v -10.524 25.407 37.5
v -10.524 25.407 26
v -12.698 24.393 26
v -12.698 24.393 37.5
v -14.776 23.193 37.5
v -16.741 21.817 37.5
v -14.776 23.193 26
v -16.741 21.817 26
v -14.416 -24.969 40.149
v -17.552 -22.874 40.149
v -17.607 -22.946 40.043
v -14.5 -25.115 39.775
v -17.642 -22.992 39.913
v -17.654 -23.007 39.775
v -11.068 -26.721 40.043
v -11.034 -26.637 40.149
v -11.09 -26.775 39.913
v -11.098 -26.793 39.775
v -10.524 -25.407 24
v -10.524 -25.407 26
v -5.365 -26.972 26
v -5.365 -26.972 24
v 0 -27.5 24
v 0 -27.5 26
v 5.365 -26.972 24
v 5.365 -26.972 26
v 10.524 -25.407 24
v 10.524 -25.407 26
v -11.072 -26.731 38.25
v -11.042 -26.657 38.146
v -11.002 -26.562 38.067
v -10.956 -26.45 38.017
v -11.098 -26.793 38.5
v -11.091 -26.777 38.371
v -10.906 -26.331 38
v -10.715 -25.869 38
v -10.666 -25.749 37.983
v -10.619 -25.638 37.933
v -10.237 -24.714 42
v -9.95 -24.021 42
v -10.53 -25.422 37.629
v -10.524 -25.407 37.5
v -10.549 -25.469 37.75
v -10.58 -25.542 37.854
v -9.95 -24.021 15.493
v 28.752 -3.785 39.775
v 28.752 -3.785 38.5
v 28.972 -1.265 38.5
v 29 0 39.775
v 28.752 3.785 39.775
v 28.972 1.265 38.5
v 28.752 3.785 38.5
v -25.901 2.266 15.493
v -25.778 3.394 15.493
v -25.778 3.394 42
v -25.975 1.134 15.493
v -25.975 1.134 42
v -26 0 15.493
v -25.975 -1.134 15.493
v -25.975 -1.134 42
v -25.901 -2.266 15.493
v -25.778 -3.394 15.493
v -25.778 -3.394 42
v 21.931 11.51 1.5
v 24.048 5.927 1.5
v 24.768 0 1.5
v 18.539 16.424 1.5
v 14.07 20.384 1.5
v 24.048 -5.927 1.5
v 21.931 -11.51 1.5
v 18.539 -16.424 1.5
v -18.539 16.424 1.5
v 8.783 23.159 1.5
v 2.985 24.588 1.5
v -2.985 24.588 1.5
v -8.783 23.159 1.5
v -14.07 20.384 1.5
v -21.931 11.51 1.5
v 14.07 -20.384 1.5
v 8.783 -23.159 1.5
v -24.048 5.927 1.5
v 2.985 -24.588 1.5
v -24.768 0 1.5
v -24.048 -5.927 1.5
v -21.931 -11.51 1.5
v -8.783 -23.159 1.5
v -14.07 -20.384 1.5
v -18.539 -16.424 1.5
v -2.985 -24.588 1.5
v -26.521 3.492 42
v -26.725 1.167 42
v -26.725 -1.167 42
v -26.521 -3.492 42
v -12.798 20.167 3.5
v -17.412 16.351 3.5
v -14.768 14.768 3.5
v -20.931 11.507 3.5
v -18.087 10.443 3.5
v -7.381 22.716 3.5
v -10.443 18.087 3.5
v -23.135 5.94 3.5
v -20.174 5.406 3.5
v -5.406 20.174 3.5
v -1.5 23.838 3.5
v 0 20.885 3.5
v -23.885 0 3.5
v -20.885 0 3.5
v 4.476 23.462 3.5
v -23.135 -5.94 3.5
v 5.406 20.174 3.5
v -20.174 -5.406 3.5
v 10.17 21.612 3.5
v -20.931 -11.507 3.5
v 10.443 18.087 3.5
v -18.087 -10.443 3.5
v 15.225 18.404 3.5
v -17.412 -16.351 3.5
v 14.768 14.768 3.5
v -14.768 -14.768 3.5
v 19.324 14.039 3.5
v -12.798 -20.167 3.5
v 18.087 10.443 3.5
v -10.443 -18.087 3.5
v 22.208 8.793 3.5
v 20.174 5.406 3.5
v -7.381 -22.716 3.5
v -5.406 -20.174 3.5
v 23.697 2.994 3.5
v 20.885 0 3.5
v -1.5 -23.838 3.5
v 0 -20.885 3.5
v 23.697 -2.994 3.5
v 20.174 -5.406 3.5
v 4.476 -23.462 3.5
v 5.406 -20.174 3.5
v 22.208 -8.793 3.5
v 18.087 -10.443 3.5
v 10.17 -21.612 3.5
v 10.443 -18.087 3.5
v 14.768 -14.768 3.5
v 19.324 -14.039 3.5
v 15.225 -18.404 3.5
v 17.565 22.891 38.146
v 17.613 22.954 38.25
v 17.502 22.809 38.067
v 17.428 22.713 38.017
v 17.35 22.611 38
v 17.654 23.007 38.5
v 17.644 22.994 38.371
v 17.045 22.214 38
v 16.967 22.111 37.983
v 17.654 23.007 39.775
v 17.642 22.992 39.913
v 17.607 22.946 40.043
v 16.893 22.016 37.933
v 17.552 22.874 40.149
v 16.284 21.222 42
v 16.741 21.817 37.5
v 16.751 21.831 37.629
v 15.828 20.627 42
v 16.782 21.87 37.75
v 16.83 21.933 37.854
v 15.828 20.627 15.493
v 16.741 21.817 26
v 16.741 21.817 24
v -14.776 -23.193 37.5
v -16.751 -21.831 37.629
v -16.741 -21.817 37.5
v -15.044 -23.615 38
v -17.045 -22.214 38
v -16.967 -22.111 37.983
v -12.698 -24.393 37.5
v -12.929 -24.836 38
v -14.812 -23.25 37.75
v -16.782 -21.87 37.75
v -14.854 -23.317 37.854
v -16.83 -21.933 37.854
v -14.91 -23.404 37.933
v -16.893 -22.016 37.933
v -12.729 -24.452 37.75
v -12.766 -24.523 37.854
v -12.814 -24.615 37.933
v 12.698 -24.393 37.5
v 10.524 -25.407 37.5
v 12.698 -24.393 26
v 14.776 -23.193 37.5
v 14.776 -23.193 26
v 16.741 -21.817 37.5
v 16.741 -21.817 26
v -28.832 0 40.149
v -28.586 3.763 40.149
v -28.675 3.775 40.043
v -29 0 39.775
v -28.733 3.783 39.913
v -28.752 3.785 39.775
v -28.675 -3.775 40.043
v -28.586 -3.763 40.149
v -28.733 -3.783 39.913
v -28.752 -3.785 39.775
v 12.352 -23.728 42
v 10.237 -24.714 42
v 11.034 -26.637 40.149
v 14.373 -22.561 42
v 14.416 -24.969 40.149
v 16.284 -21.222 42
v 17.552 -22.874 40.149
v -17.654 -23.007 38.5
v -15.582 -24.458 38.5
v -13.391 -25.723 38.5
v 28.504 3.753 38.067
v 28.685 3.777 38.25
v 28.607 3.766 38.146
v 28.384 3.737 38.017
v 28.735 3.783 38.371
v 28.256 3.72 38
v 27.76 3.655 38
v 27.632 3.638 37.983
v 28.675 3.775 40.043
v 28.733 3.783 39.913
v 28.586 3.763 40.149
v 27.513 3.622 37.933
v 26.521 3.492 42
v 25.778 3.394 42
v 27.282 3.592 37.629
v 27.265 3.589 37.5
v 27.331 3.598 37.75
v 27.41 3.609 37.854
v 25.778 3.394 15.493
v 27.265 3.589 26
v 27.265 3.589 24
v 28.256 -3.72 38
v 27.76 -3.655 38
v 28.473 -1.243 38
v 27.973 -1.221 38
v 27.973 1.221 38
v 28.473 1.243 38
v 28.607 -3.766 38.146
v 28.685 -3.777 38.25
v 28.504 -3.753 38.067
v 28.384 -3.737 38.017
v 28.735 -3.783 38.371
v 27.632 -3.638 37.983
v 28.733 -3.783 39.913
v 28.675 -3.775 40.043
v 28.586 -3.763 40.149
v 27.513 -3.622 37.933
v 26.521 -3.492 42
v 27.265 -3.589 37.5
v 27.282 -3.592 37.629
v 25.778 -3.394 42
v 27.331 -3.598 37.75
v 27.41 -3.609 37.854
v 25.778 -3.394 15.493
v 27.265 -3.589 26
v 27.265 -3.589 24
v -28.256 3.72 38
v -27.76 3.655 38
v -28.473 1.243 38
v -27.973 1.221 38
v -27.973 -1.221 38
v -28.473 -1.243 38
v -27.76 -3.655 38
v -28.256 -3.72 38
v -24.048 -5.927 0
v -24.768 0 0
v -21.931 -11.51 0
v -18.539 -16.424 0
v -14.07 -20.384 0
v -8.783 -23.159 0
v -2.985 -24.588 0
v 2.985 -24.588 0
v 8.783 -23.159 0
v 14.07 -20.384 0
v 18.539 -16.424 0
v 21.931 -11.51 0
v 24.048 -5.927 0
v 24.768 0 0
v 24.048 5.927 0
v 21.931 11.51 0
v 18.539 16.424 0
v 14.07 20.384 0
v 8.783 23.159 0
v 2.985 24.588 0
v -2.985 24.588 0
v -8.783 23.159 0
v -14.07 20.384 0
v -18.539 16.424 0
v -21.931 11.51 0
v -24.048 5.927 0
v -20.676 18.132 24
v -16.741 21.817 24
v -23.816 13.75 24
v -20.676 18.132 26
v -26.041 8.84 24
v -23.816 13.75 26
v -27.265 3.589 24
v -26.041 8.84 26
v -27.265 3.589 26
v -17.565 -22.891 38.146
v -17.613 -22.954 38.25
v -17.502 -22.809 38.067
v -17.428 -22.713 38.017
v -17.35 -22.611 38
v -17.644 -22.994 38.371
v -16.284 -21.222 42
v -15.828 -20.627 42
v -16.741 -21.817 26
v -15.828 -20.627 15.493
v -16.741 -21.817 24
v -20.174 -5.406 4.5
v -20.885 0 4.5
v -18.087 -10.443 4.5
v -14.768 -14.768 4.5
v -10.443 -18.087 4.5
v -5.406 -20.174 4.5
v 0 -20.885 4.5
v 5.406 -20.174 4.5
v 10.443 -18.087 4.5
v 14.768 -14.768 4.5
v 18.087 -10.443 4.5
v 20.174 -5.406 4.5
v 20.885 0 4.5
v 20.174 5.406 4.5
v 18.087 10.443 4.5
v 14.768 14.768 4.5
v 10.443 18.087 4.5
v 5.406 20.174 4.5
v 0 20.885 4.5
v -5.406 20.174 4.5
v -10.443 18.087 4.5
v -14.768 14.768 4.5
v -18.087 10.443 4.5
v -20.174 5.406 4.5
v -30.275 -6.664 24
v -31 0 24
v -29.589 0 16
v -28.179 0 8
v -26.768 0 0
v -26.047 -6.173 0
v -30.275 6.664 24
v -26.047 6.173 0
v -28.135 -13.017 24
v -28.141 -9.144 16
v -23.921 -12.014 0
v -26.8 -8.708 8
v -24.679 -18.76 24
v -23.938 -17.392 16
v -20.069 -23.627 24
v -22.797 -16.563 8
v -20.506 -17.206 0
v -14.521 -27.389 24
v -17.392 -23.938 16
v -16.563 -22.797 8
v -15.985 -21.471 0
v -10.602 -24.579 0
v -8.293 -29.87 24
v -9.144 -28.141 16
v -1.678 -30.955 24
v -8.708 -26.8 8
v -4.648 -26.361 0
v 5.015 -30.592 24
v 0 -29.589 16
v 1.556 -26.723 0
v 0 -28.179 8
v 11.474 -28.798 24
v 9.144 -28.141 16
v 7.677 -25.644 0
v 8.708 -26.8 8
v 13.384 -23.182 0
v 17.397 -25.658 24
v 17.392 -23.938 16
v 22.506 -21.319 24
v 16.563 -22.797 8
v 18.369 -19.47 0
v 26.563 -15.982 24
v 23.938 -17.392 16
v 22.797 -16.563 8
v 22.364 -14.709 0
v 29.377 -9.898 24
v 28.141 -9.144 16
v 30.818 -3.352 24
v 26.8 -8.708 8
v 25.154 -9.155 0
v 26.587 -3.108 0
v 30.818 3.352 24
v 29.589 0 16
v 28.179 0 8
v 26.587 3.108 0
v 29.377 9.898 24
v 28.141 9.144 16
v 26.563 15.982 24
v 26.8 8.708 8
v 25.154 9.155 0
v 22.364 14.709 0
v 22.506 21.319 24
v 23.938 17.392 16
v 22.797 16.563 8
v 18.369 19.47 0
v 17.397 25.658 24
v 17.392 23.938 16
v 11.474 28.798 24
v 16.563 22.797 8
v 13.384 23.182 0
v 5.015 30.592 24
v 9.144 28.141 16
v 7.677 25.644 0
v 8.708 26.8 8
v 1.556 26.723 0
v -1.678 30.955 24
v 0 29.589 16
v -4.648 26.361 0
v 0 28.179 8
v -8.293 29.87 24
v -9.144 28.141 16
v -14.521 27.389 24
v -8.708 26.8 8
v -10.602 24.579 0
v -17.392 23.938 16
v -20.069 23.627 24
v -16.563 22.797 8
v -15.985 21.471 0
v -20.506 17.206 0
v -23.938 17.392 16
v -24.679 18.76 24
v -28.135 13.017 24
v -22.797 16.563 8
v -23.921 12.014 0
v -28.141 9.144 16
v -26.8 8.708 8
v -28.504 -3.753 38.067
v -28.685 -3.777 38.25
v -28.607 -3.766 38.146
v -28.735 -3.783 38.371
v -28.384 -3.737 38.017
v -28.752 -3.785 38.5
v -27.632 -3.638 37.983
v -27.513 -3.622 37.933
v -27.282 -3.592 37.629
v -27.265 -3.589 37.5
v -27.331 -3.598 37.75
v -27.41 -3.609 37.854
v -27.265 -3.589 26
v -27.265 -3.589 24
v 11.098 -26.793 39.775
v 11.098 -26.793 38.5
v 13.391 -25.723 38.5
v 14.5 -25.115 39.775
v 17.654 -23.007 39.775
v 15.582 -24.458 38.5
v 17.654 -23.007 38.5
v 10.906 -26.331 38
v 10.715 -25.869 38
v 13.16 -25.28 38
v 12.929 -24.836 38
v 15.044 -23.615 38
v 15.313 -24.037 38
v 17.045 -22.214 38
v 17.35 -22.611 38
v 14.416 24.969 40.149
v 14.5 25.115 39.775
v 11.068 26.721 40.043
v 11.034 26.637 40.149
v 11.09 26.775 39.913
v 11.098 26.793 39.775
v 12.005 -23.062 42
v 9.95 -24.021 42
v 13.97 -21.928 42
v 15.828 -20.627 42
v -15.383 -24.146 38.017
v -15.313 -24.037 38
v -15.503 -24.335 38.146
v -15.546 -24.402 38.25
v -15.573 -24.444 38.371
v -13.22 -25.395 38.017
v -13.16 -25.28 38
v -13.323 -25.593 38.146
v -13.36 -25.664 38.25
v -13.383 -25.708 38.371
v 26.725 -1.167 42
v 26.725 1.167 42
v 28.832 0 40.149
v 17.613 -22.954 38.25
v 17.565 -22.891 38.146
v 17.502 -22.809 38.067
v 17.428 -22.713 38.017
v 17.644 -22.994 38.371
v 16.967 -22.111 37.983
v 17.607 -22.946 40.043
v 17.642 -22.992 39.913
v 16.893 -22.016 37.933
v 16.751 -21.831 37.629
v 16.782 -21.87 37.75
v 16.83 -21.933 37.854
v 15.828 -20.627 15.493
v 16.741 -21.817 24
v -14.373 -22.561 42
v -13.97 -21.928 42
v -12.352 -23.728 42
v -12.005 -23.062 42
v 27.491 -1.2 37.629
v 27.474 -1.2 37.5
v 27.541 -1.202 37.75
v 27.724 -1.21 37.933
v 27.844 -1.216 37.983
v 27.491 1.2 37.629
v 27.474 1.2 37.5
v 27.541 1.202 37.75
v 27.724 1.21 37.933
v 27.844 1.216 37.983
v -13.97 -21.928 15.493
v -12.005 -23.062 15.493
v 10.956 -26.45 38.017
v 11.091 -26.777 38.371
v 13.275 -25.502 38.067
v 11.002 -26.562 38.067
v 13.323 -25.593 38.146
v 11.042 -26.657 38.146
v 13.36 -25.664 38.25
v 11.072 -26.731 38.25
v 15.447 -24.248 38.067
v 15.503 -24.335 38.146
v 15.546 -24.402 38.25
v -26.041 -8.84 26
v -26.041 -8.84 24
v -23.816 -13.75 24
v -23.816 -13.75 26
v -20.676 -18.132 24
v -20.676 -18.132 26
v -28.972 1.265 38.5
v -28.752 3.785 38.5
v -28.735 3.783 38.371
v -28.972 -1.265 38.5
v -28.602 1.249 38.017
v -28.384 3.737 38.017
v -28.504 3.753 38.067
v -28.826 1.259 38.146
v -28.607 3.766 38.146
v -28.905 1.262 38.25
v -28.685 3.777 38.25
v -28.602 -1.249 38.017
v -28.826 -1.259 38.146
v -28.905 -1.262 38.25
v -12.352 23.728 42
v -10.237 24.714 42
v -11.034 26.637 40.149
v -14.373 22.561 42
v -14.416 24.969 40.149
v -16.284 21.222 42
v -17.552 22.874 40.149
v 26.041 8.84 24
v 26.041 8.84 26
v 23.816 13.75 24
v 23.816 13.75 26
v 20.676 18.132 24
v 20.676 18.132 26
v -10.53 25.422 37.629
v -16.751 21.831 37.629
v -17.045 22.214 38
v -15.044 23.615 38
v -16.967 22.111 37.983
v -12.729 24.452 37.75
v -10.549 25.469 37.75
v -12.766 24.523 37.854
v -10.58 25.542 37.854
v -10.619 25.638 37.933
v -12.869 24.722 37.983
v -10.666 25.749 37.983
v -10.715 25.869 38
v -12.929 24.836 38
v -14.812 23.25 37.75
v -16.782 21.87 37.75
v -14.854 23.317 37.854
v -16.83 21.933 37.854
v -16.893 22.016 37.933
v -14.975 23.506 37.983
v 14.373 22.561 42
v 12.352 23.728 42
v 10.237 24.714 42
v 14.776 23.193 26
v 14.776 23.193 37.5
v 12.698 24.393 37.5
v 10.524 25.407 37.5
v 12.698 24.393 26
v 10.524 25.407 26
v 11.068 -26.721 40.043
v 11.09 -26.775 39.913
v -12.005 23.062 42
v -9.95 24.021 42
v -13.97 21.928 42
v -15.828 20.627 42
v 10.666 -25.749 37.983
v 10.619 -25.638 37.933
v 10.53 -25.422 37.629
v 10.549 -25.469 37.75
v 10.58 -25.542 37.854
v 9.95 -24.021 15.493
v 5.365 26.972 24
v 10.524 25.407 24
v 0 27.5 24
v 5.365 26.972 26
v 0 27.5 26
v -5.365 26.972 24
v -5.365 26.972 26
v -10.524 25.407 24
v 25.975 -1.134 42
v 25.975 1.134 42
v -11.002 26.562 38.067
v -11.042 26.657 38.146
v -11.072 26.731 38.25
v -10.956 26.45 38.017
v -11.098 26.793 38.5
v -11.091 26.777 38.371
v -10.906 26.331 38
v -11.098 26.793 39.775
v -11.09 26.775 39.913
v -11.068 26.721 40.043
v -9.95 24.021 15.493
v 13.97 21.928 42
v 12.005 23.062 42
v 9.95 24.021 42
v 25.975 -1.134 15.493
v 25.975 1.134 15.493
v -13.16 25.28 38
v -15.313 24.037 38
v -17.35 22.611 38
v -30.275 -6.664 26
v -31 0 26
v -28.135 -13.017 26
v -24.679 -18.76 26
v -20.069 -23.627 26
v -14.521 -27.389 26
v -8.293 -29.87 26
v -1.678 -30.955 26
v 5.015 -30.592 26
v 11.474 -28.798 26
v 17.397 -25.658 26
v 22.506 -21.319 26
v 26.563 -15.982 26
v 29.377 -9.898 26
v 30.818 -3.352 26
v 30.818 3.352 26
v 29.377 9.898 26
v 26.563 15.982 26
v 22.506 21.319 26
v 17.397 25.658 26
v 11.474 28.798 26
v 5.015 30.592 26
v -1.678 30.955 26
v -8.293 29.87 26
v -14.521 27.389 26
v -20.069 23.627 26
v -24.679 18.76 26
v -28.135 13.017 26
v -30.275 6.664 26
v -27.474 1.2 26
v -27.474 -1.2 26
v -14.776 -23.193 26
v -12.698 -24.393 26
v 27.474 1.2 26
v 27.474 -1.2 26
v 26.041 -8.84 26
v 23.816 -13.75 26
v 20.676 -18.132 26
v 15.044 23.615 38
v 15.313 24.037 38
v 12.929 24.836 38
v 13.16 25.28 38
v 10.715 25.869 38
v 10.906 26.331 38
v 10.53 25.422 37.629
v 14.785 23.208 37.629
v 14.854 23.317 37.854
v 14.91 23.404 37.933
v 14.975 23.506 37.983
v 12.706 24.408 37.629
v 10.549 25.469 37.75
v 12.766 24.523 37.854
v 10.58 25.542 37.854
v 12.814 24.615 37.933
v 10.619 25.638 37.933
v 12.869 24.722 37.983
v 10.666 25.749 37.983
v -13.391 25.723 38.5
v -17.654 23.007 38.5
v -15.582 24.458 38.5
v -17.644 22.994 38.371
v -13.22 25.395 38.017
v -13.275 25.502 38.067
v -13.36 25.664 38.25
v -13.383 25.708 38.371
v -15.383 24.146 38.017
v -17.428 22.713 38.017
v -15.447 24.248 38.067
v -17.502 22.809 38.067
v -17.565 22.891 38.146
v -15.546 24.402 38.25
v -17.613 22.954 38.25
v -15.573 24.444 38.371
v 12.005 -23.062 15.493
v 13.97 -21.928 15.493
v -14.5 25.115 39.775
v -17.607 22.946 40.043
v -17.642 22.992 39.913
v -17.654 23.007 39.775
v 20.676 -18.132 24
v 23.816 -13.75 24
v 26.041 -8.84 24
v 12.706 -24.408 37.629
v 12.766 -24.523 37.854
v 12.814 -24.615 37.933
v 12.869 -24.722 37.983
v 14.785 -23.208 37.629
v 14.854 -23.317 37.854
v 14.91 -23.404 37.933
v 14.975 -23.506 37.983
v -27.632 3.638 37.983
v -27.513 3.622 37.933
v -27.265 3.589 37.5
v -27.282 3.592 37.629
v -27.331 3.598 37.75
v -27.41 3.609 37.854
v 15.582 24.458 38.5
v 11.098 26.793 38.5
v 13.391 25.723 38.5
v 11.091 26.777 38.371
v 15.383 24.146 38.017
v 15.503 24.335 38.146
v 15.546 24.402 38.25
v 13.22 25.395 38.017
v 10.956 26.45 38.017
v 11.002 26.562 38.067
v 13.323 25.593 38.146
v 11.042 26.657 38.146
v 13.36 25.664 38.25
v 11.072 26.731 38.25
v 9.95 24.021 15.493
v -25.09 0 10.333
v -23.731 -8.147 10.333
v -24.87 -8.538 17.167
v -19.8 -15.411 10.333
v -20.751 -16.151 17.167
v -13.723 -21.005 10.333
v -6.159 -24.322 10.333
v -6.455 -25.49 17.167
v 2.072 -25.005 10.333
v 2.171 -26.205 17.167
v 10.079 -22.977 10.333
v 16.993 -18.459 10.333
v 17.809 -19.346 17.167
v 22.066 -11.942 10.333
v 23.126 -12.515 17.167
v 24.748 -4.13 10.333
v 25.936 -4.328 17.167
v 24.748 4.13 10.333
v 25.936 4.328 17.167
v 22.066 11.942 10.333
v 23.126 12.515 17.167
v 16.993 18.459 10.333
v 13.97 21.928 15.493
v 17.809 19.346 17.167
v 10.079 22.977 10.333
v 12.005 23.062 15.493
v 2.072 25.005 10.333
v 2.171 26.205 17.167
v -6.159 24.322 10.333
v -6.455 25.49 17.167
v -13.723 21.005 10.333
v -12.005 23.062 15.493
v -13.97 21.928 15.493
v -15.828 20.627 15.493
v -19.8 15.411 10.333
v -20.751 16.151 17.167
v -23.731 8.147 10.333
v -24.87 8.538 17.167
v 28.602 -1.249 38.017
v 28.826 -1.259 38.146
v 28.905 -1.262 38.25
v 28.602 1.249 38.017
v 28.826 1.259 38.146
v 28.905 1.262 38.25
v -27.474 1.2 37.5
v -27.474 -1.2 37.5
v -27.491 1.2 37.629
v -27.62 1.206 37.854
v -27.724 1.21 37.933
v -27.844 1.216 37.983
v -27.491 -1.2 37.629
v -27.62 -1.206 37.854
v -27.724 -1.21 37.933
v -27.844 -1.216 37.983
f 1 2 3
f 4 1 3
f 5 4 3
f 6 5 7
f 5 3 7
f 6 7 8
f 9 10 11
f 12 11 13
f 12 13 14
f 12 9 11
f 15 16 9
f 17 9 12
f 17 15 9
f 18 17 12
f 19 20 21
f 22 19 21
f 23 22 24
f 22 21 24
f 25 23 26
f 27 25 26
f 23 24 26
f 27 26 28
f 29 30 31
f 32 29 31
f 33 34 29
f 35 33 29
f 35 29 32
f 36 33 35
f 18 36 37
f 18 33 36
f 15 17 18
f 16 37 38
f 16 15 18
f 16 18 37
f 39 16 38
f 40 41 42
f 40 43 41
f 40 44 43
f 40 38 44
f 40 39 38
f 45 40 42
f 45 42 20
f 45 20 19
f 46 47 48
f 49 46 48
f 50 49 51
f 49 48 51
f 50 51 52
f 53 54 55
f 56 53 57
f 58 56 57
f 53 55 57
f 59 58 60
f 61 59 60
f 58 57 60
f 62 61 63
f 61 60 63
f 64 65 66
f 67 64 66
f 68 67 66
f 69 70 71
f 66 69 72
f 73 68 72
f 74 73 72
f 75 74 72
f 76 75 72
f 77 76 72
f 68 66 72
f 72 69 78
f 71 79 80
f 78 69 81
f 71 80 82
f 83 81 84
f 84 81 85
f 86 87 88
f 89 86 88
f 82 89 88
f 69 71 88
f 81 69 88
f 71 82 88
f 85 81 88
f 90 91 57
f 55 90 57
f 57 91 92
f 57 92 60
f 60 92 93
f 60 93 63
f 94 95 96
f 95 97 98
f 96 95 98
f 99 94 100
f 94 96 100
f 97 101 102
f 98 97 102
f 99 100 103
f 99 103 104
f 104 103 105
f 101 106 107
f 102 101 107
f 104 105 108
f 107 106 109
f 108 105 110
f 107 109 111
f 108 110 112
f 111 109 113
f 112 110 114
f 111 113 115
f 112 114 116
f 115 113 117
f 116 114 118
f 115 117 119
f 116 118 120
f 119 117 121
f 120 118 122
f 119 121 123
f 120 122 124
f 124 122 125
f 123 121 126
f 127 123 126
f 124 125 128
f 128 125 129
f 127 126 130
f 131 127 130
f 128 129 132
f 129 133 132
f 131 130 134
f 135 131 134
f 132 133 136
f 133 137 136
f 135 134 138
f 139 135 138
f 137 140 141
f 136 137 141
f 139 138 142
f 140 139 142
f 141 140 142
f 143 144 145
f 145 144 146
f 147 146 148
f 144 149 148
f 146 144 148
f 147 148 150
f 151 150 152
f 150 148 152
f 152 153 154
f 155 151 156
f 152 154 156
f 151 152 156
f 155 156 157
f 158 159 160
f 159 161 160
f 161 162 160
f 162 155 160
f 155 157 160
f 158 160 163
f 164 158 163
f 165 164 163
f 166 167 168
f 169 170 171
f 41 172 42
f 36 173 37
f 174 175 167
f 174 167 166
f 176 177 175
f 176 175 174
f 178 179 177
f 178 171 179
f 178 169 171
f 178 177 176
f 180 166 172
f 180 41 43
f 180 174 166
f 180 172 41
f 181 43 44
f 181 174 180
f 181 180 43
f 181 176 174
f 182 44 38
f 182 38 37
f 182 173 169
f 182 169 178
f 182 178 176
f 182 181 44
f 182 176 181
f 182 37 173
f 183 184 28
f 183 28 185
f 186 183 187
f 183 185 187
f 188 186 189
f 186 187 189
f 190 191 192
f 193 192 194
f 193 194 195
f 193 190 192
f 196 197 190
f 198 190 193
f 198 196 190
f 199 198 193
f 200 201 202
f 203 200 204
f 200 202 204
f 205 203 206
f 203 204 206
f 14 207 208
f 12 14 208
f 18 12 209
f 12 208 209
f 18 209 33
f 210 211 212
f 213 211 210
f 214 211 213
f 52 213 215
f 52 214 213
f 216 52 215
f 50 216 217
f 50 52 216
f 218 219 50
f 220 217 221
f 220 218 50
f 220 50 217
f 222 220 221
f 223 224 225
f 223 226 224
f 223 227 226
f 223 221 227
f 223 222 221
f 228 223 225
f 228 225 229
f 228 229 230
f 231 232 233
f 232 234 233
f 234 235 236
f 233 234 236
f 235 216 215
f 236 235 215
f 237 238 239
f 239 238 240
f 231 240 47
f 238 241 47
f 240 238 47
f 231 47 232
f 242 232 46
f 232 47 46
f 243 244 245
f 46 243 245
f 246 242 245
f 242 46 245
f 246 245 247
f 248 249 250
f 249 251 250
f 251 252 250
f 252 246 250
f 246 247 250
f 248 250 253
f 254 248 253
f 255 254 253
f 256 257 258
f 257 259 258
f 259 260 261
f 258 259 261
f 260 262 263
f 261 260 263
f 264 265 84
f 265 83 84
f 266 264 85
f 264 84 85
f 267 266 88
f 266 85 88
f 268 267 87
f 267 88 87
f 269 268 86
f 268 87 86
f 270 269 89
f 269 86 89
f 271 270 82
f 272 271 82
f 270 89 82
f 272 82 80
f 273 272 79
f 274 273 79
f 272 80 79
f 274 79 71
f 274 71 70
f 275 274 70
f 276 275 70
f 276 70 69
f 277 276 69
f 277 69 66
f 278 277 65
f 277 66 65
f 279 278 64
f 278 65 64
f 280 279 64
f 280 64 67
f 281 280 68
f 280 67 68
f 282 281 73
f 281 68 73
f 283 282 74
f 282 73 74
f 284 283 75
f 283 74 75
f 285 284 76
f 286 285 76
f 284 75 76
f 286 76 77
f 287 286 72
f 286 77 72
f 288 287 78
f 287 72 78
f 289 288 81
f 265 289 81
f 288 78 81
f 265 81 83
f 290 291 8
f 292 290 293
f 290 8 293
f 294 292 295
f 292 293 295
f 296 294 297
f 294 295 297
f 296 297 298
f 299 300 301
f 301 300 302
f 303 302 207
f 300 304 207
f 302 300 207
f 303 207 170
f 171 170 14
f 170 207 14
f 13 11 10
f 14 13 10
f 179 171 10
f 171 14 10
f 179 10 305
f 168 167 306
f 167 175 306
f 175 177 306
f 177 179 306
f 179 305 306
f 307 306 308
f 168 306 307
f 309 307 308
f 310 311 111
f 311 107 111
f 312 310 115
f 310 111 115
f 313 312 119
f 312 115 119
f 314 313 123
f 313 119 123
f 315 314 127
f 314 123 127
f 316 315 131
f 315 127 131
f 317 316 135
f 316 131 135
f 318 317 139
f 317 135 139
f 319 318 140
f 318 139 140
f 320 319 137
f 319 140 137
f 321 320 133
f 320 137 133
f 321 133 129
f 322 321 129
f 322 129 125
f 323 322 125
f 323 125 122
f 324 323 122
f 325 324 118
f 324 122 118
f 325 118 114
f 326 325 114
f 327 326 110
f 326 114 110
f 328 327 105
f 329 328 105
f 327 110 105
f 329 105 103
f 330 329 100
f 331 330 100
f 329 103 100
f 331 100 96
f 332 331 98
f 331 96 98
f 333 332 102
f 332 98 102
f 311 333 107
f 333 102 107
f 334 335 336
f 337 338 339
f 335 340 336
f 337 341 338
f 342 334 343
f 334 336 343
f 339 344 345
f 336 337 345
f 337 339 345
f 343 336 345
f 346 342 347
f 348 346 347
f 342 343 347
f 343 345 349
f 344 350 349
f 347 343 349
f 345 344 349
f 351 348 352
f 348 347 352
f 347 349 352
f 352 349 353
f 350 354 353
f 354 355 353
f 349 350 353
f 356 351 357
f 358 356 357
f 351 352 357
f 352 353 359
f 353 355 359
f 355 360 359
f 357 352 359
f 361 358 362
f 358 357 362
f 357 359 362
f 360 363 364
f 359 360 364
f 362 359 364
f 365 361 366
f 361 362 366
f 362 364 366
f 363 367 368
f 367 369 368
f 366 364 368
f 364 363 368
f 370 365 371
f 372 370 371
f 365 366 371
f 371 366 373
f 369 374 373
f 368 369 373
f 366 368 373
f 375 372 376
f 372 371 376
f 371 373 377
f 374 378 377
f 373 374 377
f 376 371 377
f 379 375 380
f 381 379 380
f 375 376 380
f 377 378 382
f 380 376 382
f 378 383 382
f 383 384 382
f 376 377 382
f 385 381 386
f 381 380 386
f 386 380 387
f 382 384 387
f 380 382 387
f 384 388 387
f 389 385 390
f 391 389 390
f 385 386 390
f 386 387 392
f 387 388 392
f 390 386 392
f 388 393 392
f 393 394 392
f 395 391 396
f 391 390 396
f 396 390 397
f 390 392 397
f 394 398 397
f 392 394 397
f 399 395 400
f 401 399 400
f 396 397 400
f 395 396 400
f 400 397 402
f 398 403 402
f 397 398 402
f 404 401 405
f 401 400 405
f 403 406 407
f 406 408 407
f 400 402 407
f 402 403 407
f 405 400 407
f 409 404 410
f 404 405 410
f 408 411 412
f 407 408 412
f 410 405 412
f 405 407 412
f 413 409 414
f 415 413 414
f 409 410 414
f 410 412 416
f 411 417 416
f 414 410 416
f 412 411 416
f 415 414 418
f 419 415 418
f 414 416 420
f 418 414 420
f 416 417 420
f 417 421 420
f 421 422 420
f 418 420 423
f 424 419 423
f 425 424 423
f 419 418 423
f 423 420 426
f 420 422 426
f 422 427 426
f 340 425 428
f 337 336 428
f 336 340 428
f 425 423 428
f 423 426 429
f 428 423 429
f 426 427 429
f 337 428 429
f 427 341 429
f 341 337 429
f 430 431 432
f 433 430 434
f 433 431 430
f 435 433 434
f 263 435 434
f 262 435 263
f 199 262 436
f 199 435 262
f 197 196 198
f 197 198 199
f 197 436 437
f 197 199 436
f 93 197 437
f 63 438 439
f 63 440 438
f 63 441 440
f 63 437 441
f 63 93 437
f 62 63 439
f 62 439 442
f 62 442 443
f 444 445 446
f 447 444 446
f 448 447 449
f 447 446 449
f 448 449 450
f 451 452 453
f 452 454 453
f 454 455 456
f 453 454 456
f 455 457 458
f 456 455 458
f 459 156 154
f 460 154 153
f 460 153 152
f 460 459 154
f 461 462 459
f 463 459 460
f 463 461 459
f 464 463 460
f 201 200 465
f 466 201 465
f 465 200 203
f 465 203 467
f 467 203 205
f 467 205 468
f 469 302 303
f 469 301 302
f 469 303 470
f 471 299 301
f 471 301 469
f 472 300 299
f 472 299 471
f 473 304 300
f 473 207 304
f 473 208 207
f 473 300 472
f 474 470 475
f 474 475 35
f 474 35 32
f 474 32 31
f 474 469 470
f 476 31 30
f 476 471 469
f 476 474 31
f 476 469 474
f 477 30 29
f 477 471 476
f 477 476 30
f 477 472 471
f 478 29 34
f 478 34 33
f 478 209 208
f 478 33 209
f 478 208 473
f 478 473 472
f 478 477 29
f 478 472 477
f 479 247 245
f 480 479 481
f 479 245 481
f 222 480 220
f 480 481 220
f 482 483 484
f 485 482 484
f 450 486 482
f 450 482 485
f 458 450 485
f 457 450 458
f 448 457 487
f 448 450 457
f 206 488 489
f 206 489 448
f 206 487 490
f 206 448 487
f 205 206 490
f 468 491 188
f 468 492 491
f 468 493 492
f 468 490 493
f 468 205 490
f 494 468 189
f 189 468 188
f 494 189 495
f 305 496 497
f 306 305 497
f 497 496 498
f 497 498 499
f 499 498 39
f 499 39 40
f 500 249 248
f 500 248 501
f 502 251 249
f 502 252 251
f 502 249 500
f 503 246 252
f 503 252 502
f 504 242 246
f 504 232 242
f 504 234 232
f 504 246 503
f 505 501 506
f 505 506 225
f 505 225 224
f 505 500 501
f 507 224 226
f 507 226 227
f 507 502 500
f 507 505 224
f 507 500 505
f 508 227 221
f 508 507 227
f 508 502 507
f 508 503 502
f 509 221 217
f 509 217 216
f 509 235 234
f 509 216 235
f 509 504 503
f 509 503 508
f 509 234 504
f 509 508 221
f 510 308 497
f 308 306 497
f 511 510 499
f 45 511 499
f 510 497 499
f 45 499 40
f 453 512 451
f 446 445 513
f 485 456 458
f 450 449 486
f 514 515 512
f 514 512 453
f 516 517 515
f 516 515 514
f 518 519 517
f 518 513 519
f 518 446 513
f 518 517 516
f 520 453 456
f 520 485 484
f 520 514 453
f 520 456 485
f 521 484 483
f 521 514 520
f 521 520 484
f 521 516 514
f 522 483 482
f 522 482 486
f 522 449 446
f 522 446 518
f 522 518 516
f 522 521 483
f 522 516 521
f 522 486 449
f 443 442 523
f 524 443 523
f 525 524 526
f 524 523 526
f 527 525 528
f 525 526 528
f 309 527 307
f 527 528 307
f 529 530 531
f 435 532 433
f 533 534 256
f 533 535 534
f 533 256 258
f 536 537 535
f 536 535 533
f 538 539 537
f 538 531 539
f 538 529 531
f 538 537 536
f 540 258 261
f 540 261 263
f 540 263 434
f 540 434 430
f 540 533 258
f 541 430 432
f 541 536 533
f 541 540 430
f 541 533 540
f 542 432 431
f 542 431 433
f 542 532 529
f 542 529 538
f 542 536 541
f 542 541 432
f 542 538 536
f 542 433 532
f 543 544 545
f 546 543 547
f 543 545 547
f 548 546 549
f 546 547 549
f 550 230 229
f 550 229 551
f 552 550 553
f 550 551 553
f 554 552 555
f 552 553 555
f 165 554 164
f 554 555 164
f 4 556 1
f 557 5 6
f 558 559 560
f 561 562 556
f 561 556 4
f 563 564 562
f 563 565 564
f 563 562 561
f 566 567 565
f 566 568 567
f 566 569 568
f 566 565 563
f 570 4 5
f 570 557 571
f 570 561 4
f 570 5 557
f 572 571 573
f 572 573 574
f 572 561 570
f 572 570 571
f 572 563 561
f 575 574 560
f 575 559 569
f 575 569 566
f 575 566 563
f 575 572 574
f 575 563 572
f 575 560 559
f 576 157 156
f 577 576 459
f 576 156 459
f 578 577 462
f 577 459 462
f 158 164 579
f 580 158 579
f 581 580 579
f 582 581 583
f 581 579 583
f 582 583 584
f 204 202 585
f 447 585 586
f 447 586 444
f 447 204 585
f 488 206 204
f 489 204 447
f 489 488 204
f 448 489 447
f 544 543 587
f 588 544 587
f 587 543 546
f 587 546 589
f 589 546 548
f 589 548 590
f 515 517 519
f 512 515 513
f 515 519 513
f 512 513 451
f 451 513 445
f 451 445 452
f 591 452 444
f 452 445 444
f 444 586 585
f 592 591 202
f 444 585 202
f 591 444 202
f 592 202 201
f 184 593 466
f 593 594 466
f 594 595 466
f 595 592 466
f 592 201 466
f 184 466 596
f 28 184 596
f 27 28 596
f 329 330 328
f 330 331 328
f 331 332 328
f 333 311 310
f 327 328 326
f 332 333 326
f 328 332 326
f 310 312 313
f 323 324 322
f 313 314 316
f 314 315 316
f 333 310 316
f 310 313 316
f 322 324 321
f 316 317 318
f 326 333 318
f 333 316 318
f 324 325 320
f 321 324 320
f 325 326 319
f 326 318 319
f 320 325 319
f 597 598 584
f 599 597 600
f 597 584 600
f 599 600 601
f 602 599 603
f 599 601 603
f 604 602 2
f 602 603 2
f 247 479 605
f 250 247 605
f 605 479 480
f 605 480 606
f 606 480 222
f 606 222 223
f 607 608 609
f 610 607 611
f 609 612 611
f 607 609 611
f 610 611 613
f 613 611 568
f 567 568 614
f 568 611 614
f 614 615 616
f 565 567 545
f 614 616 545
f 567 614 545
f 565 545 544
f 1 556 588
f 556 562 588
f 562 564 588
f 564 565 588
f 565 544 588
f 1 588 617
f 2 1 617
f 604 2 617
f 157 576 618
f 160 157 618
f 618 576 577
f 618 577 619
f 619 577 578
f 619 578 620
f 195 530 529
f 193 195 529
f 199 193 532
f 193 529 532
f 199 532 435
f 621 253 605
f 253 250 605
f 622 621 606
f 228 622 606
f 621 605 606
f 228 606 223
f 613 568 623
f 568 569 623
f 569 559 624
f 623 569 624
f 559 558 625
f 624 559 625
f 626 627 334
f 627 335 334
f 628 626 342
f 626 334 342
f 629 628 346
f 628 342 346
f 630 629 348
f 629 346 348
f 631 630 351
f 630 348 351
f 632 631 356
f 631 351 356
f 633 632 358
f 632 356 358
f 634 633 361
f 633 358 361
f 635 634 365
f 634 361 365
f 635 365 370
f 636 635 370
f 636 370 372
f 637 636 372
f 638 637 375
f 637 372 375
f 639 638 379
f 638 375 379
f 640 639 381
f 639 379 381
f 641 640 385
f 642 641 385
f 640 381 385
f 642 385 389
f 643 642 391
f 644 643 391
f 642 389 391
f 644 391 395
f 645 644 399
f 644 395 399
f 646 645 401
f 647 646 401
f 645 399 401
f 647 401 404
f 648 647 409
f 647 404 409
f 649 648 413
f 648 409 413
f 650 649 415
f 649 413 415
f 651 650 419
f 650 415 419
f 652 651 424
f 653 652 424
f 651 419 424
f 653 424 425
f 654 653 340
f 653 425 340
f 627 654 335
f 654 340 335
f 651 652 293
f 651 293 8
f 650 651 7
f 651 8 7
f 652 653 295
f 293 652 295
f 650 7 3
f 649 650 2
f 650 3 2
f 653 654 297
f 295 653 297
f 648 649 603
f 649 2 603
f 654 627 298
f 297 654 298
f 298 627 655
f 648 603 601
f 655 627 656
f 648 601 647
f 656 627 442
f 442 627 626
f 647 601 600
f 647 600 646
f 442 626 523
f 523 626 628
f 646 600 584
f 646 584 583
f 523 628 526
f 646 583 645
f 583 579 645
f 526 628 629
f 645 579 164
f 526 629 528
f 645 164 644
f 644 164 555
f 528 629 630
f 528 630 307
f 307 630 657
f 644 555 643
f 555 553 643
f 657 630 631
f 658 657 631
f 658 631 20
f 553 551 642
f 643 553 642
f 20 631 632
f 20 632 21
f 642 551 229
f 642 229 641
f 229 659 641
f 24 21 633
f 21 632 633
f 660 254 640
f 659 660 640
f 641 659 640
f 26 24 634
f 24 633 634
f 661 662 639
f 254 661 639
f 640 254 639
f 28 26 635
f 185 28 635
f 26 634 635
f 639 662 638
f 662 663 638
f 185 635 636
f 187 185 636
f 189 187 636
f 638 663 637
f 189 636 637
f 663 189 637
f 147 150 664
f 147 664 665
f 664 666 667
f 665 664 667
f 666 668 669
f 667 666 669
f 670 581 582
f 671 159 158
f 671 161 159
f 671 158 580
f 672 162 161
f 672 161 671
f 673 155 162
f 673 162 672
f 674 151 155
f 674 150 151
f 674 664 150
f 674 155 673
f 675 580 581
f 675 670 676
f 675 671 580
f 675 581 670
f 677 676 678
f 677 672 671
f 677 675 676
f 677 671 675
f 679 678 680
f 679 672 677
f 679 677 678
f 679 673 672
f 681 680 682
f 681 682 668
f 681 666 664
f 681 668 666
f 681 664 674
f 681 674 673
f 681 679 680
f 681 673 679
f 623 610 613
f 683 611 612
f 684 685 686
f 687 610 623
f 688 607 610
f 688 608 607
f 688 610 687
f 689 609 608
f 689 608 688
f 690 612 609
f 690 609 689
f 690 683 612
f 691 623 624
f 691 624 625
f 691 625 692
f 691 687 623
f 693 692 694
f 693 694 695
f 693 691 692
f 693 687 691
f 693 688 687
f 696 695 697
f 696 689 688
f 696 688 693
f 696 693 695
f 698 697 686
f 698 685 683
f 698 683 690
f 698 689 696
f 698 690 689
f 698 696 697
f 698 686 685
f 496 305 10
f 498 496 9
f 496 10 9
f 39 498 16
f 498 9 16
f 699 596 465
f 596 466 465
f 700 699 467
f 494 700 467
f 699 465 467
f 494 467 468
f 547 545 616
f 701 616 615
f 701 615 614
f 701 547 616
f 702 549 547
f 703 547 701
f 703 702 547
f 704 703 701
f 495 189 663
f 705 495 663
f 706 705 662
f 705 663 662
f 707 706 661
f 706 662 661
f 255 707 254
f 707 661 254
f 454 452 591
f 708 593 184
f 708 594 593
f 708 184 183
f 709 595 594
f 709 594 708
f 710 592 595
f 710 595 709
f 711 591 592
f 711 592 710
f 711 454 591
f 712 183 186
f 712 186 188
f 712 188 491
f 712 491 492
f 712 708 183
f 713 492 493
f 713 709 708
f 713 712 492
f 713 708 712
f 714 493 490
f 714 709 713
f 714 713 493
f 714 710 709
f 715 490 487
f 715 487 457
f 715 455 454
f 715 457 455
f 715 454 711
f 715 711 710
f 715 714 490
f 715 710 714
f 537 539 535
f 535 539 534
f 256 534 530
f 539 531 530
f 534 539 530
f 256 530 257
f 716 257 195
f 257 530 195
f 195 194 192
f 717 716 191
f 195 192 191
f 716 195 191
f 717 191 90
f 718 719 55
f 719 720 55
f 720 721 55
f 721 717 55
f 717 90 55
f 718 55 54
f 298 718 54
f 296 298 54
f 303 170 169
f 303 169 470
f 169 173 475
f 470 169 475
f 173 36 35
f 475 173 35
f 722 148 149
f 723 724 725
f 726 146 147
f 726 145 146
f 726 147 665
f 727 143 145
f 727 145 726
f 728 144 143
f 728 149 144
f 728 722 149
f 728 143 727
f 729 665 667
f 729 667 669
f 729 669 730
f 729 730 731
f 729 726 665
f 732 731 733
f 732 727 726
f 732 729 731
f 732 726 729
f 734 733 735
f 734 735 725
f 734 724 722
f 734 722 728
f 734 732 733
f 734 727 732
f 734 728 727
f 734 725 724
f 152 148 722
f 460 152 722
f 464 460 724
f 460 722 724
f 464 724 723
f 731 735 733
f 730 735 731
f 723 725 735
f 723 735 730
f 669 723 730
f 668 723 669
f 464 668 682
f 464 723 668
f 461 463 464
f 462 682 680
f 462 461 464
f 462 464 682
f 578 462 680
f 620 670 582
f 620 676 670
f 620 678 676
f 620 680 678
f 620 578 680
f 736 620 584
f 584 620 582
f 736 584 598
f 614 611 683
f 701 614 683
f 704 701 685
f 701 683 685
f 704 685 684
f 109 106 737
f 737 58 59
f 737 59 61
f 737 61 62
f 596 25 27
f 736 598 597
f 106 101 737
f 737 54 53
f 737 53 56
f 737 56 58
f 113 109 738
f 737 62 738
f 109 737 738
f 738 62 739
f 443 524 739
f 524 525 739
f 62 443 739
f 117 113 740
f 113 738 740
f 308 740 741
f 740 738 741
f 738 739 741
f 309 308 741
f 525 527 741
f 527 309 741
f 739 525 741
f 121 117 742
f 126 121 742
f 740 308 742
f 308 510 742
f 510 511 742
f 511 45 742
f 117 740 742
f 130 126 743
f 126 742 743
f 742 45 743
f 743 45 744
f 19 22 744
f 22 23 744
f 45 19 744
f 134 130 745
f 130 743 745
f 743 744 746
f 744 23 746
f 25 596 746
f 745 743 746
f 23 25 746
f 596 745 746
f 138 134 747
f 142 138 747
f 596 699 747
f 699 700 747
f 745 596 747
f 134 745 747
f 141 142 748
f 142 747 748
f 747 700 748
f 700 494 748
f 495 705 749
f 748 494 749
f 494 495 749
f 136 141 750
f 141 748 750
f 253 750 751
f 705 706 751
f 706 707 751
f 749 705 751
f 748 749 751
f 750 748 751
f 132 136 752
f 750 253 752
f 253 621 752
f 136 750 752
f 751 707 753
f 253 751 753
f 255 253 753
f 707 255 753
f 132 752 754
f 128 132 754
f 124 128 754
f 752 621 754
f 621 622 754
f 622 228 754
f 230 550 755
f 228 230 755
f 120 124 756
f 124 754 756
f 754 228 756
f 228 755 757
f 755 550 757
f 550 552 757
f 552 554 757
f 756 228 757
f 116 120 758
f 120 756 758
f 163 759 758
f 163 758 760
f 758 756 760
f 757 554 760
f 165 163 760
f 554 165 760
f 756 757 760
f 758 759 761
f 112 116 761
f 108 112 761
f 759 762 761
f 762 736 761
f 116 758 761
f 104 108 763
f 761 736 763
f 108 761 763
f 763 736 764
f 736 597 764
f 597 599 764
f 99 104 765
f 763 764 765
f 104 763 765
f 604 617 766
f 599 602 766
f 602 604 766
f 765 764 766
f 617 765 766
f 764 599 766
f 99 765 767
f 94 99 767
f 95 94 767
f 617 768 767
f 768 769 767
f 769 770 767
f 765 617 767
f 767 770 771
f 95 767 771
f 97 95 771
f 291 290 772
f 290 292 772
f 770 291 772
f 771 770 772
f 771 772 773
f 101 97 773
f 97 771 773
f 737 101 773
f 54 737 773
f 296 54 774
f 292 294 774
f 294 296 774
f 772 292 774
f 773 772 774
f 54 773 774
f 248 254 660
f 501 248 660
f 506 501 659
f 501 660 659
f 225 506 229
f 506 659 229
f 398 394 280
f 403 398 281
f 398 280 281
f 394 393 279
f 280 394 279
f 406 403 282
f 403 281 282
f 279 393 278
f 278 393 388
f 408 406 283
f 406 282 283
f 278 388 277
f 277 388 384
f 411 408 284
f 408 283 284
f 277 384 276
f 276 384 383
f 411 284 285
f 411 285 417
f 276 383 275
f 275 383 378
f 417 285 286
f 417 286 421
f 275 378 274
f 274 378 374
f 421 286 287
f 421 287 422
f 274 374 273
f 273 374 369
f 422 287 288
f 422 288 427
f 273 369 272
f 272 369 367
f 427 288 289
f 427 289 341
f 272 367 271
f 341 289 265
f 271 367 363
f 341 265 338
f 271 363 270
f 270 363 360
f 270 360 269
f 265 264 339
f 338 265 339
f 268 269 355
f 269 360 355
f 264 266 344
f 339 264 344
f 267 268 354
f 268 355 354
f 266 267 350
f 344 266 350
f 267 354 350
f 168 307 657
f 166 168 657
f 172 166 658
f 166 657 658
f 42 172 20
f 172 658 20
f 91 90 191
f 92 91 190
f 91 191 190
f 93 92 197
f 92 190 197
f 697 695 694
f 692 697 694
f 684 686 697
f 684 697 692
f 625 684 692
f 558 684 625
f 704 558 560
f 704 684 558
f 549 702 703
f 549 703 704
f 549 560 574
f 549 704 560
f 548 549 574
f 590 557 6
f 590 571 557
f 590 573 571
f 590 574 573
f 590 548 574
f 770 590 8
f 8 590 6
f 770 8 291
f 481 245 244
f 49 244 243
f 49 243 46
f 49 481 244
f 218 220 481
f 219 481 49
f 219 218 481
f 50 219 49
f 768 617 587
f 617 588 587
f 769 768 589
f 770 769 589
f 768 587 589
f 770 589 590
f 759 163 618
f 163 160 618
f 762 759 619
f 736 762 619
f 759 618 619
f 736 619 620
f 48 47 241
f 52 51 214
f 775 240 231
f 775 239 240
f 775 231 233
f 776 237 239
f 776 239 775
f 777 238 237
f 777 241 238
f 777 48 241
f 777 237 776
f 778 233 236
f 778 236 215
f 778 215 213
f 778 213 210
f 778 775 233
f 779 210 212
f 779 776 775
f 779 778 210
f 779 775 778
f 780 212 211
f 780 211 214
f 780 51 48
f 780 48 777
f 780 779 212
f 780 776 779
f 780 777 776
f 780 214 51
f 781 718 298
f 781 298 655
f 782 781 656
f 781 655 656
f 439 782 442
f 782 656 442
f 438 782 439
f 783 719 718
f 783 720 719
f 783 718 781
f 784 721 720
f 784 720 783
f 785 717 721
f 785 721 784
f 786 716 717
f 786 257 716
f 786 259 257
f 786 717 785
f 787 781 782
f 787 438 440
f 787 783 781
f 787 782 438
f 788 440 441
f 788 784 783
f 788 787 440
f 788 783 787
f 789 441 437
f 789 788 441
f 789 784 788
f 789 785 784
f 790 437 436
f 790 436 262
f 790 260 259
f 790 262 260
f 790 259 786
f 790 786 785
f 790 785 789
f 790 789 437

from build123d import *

# Parameters (mm, degrees)
F3_ANGLE_BACK   = 7.5
F3_ANGLE        = 15
F3_COPIES_COUNT = 6
F4_R            = 0.5


# Not quite as in the source:
# - a pattern or mirror of a feature is missing from the dataset's text; its kind, count and spacing are read off the source's solid


with BuildPart() as f1:
    # F0 (on Front) → F1 (revolve)
    with BuildSketch(Plane.XZ):
        Polygon((-24.768152463, 1.5), (0, 1.5), (0, 4.5), (-20.8852968955, 4.5), (-20.8852968955, 3.5), (-23.8852968955, 3.5), (-27.5, 24), (-27.5, 26), (-31, 26), (-31, 24), (-26.768152463, 0), (-24.768152463, 0), align=None)
    revolve(axis=Axis((0, 0, 25), (0, 0, 1)))

    # F2 (on Front) → F3 (revolve)
    with BuildSketch(Plane.XZ, mode=Mode.PRIVATE) as f3_sk:
        Polygon((-27.5, 38), (-27.5, 24), (-26, 15.4930772706), (-26, 42), (-26.75, 42), (-29, 40), (-29, 38), align=None)
    f3 = revolve(f3_sk.sketch.rotate(Axis((0, 0, 25), (0, 0, 1)), -F3_ANGLE_BACK), axis=Axis((0, 0, 25), (0, 0, 1)), revolution_arc=F3_ANGLE)

    # F3_copies: F3 ×6 about axis
    f3_copies_axis = Axis((0, 0, 0), (0, 0, 1))
    for i in range(1, F3_COPIES_COUNT):
        add(f3.rotate(f3_copies_axis, i * 360 / F3_COPIES_COUNT))

    # F4
    f4_edges = [f1.edges().sort_by_distance(p)[0] for p in [
        (-29, 0, 38),
        (-29, 0, 40),
        (-27.5, 0, 38),
        (-13.75, -23.815699, 38),
        (13.75, -23.815699, 38),
        (27.5, 0, 38),
        (13.75, 23.815699, 38),
        (-13.75, 23.815699, 38),
        (-14.5, -25.114737, 38),
        (14.5, -25.114737, 38),
        (29, 0, 38),
        (14.5, 25.114737, 38),
        (-14.5, 25.114737, 38),
        (-14.5, -25.114737, 40),
        (14.5, -25.114737, 40),
        (29, 0, 40),
        (14.5, 25.114737, 40),
        (-14.5, 25.114737, 40),
    ]]
    fillet(f4_edges, radius=F4_R)


solid = f1.part
